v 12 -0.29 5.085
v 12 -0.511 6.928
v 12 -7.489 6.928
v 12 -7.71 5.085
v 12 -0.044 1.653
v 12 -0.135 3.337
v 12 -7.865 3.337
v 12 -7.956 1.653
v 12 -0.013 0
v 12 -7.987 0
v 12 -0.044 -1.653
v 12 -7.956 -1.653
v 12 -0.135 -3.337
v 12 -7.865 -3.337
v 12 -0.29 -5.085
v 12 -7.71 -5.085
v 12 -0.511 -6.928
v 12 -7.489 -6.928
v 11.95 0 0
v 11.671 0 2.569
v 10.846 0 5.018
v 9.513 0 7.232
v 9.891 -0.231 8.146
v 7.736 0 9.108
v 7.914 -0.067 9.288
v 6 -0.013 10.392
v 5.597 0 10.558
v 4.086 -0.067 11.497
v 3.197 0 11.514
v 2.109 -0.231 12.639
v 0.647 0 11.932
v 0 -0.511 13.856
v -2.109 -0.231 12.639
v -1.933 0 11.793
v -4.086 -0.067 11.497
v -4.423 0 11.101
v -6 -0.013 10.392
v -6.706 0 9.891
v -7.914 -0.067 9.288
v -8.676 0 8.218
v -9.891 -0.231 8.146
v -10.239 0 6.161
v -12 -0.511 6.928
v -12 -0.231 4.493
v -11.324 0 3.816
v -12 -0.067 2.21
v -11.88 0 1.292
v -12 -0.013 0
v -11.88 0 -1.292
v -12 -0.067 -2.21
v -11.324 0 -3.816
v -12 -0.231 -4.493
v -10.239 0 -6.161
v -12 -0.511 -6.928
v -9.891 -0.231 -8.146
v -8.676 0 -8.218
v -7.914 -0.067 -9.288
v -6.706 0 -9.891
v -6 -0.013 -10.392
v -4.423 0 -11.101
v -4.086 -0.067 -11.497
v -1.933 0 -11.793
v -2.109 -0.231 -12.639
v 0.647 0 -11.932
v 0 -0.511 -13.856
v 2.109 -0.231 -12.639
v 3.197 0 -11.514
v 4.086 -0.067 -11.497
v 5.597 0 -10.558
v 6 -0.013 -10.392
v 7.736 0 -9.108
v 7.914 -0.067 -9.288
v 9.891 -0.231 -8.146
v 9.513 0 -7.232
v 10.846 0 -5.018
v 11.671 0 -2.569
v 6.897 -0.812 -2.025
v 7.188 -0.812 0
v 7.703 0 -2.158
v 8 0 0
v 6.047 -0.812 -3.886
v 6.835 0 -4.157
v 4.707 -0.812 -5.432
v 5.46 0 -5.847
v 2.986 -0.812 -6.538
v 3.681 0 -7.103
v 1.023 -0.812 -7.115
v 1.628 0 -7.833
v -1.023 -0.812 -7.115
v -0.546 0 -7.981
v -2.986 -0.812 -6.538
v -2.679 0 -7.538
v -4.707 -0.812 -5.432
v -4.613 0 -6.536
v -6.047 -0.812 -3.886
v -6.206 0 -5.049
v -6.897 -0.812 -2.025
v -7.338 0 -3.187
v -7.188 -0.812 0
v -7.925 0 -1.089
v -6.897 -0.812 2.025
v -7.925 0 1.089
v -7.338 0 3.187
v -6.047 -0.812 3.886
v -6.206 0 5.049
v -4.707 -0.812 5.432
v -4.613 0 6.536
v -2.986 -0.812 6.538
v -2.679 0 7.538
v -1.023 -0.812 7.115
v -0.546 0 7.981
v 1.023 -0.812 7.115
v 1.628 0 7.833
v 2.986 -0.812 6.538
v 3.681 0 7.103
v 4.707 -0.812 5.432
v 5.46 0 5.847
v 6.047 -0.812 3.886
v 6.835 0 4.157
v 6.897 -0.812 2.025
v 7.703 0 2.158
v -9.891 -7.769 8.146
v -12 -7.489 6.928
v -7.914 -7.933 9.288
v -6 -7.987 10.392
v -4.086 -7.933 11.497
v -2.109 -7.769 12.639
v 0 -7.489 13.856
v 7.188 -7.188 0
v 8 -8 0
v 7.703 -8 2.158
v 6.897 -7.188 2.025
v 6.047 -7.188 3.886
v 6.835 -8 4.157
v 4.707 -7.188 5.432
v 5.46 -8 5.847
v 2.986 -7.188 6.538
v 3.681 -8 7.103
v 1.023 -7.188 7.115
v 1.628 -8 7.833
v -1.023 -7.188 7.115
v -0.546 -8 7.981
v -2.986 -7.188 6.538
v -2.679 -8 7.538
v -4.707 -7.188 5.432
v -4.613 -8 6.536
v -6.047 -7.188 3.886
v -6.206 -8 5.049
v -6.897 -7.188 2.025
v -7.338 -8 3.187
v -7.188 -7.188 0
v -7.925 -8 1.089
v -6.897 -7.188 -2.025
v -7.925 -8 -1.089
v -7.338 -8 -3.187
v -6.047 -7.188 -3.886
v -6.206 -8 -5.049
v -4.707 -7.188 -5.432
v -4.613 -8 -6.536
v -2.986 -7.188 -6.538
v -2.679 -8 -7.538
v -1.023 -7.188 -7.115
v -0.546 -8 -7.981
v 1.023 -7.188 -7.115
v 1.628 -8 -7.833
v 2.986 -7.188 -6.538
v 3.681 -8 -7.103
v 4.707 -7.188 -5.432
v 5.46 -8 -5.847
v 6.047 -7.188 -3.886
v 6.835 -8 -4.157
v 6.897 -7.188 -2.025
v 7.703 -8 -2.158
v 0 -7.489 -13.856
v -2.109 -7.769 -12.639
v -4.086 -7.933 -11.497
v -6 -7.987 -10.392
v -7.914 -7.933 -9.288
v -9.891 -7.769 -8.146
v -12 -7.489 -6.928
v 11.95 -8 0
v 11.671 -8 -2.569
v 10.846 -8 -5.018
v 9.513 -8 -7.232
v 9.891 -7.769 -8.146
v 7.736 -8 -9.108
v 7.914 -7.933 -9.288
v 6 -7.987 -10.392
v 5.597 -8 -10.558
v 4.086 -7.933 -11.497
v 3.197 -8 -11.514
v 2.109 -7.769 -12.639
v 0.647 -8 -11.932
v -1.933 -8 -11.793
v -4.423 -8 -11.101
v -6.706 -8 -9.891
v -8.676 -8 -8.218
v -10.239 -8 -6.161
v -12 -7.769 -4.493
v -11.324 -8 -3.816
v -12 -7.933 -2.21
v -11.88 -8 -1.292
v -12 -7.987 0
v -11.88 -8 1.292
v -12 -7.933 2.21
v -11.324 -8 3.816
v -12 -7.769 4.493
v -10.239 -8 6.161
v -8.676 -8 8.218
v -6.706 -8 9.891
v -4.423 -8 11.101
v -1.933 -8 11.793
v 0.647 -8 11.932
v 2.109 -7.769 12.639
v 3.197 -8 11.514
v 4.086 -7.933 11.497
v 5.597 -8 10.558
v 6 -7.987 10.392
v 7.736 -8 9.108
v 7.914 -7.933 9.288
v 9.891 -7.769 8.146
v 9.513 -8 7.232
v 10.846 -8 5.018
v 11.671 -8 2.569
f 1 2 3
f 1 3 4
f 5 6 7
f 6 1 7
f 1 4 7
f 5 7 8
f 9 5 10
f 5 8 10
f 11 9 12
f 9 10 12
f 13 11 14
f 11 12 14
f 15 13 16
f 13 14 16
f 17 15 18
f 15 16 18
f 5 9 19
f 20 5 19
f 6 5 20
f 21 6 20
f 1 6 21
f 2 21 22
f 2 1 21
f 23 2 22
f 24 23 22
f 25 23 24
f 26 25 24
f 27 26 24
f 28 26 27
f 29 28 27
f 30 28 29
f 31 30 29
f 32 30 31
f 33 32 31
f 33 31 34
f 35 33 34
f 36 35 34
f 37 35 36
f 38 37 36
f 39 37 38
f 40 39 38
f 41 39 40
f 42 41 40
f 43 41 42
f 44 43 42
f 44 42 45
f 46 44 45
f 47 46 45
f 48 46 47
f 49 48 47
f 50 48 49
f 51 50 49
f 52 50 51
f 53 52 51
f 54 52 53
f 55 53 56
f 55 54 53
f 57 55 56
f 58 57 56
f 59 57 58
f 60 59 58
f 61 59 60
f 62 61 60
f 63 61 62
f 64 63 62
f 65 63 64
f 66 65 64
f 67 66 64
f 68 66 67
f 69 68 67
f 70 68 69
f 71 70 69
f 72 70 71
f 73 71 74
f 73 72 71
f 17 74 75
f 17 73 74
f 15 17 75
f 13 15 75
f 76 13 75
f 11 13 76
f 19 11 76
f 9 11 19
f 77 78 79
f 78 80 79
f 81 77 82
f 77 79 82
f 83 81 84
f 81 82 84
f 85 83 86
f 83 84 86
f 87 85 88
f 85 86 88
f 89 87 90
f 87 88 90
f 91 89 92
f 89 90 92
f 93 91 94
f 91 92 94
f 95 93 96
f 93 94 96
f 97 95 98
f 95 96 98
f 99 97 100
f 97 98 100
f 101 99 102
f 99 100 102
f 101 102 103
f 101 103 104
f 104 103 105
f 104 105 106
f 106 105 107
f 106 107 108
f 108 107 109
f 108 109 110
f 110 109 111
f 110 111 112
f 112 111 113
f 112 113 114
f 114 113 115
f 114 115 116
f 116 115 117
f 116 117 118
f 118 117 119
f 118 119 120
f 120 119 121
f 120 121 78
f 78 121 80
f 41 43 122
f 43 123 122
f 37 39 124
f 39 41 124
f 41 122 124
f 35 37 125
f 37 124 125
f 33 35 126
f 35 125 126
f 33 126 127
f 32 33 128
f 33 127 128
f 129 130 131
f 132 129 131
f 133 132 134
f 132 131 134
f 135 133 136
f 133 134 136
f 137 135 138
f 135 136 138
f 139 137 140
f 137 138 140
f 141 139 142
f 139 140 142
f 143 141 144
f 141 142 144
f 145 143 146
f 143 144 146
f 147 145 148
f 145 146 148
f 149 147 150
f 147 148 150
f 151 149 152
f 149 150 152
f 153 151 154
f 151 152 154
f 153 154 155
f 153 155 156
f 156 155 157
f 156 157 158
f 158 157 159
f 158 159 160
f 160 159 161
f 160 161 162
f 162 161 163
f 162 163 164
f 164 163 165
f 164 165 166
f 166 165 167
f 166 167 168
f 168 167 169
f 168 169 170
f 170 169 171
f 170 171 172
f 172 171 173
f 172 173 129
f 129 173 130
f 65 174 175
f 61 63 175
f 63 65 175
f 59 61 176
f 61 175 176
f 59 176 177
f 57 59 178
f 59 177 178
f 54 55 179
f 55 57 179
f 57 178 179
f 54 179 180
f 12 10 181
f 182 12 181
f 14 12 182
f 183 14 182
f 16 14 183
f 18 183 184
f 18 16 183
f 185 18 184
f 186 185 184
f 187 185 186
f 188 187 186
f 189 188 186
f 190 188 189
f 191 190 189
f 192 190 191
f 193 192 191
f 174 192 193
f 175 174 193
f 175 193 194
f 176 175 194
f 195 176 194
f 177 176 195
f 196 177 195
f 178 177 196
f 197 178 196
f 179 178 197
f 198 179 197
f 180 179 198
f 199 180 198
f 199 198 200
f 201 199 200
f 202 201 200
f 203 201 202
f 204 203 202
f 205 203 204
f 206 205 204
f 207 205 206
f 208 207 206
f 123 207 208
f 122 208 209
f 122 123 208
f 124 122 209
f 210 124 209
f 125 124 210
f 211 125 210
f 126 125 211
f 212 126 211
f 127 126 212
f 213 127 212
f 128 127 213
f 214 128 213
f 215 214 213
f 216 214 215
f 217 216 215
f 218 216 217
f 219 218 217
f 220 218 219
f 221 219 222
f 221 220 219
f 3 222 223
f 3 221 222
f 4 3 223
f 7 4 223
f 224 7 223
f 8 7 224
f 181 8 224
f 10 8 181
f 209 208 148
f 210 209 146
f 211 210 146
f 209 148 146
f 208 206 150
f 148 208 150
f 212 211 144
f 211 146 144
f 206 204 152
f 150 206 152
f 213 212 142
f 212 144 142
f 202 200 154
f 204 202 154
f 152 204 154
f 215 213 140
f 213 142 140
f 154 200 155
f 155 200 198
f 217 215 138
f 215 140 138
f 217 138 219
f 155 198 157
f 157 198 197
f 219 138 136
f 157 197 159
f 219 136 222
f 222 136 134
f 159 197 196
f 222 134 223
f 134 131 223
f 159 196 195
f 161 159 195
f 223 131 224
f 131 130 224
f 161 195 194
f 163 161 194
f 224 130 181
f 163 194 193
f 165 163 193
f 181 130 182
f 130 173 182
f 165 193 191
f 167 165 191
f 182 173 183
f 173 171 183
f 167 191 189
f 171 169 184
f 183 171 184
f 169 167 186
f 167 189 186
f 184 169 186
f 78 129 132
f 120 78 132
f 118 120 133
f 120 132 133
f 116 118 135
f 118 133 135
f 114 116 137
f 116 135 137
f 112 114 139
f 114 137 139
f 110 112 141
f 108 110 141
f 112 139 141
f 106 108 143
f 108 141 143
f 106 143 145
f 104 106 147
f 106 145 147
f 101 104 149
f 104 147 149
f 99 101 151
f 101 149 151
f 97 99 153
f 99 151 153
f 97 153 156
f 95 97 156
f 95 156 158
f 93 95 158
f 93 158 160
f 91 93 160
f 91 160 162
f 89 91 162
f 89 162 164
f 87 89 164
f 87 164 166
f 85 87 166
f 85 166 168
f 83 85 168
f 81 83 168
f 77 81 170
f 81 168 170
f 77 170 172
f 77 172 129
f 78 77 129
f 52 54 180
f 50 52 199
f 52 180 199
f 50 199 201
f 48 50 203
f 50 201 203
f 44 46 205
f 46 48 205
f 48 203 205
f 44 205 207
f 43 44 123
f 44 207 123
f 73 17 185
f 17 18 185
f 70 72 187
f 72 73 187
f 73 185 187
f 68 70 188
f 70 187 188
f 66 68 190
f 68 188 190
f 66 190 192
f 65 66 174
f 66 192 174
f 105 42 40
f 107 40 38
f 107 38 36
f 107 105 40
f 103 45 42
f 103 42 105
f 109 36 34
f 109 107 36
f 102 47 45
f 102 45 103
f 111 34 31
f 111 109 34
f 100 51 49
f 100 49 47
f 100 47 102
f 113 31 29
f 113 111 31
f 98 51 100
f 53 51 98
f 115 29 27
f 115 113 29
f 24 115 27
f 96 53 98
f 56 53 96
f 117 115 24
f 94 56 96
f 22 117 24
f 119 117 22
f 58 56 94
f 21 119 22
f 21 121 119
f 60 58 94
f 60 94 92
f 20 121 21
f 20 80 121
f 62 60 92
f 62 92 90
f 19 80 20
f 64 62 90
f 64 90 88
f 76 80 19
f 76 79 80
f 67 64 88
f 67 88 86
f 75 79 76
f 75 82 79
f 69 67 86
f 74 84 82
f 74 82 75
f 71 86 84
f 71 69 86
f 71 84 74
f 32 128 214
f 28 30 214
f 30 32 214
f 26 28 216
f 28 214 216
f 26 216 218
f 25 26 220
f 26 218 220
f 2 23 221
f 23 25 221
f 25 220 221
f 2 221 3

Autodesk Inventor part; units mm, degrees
sketch "Sketch_1" plane through (0, 0, 0) normal (0, 0, 1) x (1, 0, 0)
  line L0 (0, -8) -> (0, 0)
  line L1 (0, 0) -> (11.95, 0)
  line L2 (11.95, 0) -> (26.8782, -4)
  line L3 (26.8782, -4) -> (11.95, -8)
  line L4 (11.95, -8) -> (0, -8)
  line L5 (0, -8) -> (0, 0)
revolve "Revolution1" add sketch "Sketch_1" angle 360 about axis through (0, -8, 0) along (0, 1, 0)
sketch "Sketch_2" plane through (0, 0, 0) normal (0, 1, 0) x (-1, 0, 0)
  line L0 (48, -48) -> (48, 48)
  line L1 (48, 48) -> (-48, 48)
  line L2 (-48, 48) -> (-48, -48)
  line L3 (-48, -48) -> (48, -48)
  line L4 (12, 6.9282) -> (0, 13.8564)
  line L5 (0, 13.8564) -> (-12, 6.9282)
  line L6 (-12, 6.9282) -> (-12, -6.9282)
  line L7 (-12, -6.9282) -> (0, -13.8564)
  line L8 (0, -13.8564) -> (12, -6.9282)
  line L9 (12, -6.9282) -> (12, 6.9282)
extrude "Extrusion1" cut sketch "Sketch_2" along normal mid plane 18
sketch "Sketch_3" plane through (0, 0, 0) normal (0, 0, 1) x (1, 0, 0)
  line L0 (0, -8) -> (0, 0)
  line L1 (0, 0) -> (8, 0)
  line L2 (8, 0) -> (7.188, -0.812)
  line L3 (7.188, -0.812) -> (7.188, -7.188)
  line L4 (7.188, -7.188) -> (8, -8)
  line L5 (8, -8) -> (0, -8)
  line L6 (0, -8) -> (0, 0)
revolve "Revolution2" cut sketch "Sketch_3" angle 360 about axis through (0, -8, 0) along (0, -1, 0)
thread "Thread1" size "M16x1.5" class "6H" standard "ISO Metric profile" full length
ref_plane "2CYL_XY" through (0, -4, 0) normal (0, 1, 0) x (1, 0, 0)
ref_plane "2CYL_YZ" through (0, -4, 0) normal (1, 0, 0) x (0, 0, -1)
ref_plane "2CYL_ZX" through (0, -4, 0) normal (0, 0, -1) x (0, 1, 0)
ref_plane "din439b_punkt_XY" through (0, 0, 0) normal (0, 1, 0) x (1, 0, 0)
ref_plane "din439b_punkt_YZ" through (0, 0, 0) normal (1, 0, 0) x (0, 0, -1)
ref_plane "din439b_punkt_ZX" through (0, 0, 0) normal (0, 0, -1) x (0, 1, 0)
properties part number "DIN-439-B - M16x1.5(F)"
